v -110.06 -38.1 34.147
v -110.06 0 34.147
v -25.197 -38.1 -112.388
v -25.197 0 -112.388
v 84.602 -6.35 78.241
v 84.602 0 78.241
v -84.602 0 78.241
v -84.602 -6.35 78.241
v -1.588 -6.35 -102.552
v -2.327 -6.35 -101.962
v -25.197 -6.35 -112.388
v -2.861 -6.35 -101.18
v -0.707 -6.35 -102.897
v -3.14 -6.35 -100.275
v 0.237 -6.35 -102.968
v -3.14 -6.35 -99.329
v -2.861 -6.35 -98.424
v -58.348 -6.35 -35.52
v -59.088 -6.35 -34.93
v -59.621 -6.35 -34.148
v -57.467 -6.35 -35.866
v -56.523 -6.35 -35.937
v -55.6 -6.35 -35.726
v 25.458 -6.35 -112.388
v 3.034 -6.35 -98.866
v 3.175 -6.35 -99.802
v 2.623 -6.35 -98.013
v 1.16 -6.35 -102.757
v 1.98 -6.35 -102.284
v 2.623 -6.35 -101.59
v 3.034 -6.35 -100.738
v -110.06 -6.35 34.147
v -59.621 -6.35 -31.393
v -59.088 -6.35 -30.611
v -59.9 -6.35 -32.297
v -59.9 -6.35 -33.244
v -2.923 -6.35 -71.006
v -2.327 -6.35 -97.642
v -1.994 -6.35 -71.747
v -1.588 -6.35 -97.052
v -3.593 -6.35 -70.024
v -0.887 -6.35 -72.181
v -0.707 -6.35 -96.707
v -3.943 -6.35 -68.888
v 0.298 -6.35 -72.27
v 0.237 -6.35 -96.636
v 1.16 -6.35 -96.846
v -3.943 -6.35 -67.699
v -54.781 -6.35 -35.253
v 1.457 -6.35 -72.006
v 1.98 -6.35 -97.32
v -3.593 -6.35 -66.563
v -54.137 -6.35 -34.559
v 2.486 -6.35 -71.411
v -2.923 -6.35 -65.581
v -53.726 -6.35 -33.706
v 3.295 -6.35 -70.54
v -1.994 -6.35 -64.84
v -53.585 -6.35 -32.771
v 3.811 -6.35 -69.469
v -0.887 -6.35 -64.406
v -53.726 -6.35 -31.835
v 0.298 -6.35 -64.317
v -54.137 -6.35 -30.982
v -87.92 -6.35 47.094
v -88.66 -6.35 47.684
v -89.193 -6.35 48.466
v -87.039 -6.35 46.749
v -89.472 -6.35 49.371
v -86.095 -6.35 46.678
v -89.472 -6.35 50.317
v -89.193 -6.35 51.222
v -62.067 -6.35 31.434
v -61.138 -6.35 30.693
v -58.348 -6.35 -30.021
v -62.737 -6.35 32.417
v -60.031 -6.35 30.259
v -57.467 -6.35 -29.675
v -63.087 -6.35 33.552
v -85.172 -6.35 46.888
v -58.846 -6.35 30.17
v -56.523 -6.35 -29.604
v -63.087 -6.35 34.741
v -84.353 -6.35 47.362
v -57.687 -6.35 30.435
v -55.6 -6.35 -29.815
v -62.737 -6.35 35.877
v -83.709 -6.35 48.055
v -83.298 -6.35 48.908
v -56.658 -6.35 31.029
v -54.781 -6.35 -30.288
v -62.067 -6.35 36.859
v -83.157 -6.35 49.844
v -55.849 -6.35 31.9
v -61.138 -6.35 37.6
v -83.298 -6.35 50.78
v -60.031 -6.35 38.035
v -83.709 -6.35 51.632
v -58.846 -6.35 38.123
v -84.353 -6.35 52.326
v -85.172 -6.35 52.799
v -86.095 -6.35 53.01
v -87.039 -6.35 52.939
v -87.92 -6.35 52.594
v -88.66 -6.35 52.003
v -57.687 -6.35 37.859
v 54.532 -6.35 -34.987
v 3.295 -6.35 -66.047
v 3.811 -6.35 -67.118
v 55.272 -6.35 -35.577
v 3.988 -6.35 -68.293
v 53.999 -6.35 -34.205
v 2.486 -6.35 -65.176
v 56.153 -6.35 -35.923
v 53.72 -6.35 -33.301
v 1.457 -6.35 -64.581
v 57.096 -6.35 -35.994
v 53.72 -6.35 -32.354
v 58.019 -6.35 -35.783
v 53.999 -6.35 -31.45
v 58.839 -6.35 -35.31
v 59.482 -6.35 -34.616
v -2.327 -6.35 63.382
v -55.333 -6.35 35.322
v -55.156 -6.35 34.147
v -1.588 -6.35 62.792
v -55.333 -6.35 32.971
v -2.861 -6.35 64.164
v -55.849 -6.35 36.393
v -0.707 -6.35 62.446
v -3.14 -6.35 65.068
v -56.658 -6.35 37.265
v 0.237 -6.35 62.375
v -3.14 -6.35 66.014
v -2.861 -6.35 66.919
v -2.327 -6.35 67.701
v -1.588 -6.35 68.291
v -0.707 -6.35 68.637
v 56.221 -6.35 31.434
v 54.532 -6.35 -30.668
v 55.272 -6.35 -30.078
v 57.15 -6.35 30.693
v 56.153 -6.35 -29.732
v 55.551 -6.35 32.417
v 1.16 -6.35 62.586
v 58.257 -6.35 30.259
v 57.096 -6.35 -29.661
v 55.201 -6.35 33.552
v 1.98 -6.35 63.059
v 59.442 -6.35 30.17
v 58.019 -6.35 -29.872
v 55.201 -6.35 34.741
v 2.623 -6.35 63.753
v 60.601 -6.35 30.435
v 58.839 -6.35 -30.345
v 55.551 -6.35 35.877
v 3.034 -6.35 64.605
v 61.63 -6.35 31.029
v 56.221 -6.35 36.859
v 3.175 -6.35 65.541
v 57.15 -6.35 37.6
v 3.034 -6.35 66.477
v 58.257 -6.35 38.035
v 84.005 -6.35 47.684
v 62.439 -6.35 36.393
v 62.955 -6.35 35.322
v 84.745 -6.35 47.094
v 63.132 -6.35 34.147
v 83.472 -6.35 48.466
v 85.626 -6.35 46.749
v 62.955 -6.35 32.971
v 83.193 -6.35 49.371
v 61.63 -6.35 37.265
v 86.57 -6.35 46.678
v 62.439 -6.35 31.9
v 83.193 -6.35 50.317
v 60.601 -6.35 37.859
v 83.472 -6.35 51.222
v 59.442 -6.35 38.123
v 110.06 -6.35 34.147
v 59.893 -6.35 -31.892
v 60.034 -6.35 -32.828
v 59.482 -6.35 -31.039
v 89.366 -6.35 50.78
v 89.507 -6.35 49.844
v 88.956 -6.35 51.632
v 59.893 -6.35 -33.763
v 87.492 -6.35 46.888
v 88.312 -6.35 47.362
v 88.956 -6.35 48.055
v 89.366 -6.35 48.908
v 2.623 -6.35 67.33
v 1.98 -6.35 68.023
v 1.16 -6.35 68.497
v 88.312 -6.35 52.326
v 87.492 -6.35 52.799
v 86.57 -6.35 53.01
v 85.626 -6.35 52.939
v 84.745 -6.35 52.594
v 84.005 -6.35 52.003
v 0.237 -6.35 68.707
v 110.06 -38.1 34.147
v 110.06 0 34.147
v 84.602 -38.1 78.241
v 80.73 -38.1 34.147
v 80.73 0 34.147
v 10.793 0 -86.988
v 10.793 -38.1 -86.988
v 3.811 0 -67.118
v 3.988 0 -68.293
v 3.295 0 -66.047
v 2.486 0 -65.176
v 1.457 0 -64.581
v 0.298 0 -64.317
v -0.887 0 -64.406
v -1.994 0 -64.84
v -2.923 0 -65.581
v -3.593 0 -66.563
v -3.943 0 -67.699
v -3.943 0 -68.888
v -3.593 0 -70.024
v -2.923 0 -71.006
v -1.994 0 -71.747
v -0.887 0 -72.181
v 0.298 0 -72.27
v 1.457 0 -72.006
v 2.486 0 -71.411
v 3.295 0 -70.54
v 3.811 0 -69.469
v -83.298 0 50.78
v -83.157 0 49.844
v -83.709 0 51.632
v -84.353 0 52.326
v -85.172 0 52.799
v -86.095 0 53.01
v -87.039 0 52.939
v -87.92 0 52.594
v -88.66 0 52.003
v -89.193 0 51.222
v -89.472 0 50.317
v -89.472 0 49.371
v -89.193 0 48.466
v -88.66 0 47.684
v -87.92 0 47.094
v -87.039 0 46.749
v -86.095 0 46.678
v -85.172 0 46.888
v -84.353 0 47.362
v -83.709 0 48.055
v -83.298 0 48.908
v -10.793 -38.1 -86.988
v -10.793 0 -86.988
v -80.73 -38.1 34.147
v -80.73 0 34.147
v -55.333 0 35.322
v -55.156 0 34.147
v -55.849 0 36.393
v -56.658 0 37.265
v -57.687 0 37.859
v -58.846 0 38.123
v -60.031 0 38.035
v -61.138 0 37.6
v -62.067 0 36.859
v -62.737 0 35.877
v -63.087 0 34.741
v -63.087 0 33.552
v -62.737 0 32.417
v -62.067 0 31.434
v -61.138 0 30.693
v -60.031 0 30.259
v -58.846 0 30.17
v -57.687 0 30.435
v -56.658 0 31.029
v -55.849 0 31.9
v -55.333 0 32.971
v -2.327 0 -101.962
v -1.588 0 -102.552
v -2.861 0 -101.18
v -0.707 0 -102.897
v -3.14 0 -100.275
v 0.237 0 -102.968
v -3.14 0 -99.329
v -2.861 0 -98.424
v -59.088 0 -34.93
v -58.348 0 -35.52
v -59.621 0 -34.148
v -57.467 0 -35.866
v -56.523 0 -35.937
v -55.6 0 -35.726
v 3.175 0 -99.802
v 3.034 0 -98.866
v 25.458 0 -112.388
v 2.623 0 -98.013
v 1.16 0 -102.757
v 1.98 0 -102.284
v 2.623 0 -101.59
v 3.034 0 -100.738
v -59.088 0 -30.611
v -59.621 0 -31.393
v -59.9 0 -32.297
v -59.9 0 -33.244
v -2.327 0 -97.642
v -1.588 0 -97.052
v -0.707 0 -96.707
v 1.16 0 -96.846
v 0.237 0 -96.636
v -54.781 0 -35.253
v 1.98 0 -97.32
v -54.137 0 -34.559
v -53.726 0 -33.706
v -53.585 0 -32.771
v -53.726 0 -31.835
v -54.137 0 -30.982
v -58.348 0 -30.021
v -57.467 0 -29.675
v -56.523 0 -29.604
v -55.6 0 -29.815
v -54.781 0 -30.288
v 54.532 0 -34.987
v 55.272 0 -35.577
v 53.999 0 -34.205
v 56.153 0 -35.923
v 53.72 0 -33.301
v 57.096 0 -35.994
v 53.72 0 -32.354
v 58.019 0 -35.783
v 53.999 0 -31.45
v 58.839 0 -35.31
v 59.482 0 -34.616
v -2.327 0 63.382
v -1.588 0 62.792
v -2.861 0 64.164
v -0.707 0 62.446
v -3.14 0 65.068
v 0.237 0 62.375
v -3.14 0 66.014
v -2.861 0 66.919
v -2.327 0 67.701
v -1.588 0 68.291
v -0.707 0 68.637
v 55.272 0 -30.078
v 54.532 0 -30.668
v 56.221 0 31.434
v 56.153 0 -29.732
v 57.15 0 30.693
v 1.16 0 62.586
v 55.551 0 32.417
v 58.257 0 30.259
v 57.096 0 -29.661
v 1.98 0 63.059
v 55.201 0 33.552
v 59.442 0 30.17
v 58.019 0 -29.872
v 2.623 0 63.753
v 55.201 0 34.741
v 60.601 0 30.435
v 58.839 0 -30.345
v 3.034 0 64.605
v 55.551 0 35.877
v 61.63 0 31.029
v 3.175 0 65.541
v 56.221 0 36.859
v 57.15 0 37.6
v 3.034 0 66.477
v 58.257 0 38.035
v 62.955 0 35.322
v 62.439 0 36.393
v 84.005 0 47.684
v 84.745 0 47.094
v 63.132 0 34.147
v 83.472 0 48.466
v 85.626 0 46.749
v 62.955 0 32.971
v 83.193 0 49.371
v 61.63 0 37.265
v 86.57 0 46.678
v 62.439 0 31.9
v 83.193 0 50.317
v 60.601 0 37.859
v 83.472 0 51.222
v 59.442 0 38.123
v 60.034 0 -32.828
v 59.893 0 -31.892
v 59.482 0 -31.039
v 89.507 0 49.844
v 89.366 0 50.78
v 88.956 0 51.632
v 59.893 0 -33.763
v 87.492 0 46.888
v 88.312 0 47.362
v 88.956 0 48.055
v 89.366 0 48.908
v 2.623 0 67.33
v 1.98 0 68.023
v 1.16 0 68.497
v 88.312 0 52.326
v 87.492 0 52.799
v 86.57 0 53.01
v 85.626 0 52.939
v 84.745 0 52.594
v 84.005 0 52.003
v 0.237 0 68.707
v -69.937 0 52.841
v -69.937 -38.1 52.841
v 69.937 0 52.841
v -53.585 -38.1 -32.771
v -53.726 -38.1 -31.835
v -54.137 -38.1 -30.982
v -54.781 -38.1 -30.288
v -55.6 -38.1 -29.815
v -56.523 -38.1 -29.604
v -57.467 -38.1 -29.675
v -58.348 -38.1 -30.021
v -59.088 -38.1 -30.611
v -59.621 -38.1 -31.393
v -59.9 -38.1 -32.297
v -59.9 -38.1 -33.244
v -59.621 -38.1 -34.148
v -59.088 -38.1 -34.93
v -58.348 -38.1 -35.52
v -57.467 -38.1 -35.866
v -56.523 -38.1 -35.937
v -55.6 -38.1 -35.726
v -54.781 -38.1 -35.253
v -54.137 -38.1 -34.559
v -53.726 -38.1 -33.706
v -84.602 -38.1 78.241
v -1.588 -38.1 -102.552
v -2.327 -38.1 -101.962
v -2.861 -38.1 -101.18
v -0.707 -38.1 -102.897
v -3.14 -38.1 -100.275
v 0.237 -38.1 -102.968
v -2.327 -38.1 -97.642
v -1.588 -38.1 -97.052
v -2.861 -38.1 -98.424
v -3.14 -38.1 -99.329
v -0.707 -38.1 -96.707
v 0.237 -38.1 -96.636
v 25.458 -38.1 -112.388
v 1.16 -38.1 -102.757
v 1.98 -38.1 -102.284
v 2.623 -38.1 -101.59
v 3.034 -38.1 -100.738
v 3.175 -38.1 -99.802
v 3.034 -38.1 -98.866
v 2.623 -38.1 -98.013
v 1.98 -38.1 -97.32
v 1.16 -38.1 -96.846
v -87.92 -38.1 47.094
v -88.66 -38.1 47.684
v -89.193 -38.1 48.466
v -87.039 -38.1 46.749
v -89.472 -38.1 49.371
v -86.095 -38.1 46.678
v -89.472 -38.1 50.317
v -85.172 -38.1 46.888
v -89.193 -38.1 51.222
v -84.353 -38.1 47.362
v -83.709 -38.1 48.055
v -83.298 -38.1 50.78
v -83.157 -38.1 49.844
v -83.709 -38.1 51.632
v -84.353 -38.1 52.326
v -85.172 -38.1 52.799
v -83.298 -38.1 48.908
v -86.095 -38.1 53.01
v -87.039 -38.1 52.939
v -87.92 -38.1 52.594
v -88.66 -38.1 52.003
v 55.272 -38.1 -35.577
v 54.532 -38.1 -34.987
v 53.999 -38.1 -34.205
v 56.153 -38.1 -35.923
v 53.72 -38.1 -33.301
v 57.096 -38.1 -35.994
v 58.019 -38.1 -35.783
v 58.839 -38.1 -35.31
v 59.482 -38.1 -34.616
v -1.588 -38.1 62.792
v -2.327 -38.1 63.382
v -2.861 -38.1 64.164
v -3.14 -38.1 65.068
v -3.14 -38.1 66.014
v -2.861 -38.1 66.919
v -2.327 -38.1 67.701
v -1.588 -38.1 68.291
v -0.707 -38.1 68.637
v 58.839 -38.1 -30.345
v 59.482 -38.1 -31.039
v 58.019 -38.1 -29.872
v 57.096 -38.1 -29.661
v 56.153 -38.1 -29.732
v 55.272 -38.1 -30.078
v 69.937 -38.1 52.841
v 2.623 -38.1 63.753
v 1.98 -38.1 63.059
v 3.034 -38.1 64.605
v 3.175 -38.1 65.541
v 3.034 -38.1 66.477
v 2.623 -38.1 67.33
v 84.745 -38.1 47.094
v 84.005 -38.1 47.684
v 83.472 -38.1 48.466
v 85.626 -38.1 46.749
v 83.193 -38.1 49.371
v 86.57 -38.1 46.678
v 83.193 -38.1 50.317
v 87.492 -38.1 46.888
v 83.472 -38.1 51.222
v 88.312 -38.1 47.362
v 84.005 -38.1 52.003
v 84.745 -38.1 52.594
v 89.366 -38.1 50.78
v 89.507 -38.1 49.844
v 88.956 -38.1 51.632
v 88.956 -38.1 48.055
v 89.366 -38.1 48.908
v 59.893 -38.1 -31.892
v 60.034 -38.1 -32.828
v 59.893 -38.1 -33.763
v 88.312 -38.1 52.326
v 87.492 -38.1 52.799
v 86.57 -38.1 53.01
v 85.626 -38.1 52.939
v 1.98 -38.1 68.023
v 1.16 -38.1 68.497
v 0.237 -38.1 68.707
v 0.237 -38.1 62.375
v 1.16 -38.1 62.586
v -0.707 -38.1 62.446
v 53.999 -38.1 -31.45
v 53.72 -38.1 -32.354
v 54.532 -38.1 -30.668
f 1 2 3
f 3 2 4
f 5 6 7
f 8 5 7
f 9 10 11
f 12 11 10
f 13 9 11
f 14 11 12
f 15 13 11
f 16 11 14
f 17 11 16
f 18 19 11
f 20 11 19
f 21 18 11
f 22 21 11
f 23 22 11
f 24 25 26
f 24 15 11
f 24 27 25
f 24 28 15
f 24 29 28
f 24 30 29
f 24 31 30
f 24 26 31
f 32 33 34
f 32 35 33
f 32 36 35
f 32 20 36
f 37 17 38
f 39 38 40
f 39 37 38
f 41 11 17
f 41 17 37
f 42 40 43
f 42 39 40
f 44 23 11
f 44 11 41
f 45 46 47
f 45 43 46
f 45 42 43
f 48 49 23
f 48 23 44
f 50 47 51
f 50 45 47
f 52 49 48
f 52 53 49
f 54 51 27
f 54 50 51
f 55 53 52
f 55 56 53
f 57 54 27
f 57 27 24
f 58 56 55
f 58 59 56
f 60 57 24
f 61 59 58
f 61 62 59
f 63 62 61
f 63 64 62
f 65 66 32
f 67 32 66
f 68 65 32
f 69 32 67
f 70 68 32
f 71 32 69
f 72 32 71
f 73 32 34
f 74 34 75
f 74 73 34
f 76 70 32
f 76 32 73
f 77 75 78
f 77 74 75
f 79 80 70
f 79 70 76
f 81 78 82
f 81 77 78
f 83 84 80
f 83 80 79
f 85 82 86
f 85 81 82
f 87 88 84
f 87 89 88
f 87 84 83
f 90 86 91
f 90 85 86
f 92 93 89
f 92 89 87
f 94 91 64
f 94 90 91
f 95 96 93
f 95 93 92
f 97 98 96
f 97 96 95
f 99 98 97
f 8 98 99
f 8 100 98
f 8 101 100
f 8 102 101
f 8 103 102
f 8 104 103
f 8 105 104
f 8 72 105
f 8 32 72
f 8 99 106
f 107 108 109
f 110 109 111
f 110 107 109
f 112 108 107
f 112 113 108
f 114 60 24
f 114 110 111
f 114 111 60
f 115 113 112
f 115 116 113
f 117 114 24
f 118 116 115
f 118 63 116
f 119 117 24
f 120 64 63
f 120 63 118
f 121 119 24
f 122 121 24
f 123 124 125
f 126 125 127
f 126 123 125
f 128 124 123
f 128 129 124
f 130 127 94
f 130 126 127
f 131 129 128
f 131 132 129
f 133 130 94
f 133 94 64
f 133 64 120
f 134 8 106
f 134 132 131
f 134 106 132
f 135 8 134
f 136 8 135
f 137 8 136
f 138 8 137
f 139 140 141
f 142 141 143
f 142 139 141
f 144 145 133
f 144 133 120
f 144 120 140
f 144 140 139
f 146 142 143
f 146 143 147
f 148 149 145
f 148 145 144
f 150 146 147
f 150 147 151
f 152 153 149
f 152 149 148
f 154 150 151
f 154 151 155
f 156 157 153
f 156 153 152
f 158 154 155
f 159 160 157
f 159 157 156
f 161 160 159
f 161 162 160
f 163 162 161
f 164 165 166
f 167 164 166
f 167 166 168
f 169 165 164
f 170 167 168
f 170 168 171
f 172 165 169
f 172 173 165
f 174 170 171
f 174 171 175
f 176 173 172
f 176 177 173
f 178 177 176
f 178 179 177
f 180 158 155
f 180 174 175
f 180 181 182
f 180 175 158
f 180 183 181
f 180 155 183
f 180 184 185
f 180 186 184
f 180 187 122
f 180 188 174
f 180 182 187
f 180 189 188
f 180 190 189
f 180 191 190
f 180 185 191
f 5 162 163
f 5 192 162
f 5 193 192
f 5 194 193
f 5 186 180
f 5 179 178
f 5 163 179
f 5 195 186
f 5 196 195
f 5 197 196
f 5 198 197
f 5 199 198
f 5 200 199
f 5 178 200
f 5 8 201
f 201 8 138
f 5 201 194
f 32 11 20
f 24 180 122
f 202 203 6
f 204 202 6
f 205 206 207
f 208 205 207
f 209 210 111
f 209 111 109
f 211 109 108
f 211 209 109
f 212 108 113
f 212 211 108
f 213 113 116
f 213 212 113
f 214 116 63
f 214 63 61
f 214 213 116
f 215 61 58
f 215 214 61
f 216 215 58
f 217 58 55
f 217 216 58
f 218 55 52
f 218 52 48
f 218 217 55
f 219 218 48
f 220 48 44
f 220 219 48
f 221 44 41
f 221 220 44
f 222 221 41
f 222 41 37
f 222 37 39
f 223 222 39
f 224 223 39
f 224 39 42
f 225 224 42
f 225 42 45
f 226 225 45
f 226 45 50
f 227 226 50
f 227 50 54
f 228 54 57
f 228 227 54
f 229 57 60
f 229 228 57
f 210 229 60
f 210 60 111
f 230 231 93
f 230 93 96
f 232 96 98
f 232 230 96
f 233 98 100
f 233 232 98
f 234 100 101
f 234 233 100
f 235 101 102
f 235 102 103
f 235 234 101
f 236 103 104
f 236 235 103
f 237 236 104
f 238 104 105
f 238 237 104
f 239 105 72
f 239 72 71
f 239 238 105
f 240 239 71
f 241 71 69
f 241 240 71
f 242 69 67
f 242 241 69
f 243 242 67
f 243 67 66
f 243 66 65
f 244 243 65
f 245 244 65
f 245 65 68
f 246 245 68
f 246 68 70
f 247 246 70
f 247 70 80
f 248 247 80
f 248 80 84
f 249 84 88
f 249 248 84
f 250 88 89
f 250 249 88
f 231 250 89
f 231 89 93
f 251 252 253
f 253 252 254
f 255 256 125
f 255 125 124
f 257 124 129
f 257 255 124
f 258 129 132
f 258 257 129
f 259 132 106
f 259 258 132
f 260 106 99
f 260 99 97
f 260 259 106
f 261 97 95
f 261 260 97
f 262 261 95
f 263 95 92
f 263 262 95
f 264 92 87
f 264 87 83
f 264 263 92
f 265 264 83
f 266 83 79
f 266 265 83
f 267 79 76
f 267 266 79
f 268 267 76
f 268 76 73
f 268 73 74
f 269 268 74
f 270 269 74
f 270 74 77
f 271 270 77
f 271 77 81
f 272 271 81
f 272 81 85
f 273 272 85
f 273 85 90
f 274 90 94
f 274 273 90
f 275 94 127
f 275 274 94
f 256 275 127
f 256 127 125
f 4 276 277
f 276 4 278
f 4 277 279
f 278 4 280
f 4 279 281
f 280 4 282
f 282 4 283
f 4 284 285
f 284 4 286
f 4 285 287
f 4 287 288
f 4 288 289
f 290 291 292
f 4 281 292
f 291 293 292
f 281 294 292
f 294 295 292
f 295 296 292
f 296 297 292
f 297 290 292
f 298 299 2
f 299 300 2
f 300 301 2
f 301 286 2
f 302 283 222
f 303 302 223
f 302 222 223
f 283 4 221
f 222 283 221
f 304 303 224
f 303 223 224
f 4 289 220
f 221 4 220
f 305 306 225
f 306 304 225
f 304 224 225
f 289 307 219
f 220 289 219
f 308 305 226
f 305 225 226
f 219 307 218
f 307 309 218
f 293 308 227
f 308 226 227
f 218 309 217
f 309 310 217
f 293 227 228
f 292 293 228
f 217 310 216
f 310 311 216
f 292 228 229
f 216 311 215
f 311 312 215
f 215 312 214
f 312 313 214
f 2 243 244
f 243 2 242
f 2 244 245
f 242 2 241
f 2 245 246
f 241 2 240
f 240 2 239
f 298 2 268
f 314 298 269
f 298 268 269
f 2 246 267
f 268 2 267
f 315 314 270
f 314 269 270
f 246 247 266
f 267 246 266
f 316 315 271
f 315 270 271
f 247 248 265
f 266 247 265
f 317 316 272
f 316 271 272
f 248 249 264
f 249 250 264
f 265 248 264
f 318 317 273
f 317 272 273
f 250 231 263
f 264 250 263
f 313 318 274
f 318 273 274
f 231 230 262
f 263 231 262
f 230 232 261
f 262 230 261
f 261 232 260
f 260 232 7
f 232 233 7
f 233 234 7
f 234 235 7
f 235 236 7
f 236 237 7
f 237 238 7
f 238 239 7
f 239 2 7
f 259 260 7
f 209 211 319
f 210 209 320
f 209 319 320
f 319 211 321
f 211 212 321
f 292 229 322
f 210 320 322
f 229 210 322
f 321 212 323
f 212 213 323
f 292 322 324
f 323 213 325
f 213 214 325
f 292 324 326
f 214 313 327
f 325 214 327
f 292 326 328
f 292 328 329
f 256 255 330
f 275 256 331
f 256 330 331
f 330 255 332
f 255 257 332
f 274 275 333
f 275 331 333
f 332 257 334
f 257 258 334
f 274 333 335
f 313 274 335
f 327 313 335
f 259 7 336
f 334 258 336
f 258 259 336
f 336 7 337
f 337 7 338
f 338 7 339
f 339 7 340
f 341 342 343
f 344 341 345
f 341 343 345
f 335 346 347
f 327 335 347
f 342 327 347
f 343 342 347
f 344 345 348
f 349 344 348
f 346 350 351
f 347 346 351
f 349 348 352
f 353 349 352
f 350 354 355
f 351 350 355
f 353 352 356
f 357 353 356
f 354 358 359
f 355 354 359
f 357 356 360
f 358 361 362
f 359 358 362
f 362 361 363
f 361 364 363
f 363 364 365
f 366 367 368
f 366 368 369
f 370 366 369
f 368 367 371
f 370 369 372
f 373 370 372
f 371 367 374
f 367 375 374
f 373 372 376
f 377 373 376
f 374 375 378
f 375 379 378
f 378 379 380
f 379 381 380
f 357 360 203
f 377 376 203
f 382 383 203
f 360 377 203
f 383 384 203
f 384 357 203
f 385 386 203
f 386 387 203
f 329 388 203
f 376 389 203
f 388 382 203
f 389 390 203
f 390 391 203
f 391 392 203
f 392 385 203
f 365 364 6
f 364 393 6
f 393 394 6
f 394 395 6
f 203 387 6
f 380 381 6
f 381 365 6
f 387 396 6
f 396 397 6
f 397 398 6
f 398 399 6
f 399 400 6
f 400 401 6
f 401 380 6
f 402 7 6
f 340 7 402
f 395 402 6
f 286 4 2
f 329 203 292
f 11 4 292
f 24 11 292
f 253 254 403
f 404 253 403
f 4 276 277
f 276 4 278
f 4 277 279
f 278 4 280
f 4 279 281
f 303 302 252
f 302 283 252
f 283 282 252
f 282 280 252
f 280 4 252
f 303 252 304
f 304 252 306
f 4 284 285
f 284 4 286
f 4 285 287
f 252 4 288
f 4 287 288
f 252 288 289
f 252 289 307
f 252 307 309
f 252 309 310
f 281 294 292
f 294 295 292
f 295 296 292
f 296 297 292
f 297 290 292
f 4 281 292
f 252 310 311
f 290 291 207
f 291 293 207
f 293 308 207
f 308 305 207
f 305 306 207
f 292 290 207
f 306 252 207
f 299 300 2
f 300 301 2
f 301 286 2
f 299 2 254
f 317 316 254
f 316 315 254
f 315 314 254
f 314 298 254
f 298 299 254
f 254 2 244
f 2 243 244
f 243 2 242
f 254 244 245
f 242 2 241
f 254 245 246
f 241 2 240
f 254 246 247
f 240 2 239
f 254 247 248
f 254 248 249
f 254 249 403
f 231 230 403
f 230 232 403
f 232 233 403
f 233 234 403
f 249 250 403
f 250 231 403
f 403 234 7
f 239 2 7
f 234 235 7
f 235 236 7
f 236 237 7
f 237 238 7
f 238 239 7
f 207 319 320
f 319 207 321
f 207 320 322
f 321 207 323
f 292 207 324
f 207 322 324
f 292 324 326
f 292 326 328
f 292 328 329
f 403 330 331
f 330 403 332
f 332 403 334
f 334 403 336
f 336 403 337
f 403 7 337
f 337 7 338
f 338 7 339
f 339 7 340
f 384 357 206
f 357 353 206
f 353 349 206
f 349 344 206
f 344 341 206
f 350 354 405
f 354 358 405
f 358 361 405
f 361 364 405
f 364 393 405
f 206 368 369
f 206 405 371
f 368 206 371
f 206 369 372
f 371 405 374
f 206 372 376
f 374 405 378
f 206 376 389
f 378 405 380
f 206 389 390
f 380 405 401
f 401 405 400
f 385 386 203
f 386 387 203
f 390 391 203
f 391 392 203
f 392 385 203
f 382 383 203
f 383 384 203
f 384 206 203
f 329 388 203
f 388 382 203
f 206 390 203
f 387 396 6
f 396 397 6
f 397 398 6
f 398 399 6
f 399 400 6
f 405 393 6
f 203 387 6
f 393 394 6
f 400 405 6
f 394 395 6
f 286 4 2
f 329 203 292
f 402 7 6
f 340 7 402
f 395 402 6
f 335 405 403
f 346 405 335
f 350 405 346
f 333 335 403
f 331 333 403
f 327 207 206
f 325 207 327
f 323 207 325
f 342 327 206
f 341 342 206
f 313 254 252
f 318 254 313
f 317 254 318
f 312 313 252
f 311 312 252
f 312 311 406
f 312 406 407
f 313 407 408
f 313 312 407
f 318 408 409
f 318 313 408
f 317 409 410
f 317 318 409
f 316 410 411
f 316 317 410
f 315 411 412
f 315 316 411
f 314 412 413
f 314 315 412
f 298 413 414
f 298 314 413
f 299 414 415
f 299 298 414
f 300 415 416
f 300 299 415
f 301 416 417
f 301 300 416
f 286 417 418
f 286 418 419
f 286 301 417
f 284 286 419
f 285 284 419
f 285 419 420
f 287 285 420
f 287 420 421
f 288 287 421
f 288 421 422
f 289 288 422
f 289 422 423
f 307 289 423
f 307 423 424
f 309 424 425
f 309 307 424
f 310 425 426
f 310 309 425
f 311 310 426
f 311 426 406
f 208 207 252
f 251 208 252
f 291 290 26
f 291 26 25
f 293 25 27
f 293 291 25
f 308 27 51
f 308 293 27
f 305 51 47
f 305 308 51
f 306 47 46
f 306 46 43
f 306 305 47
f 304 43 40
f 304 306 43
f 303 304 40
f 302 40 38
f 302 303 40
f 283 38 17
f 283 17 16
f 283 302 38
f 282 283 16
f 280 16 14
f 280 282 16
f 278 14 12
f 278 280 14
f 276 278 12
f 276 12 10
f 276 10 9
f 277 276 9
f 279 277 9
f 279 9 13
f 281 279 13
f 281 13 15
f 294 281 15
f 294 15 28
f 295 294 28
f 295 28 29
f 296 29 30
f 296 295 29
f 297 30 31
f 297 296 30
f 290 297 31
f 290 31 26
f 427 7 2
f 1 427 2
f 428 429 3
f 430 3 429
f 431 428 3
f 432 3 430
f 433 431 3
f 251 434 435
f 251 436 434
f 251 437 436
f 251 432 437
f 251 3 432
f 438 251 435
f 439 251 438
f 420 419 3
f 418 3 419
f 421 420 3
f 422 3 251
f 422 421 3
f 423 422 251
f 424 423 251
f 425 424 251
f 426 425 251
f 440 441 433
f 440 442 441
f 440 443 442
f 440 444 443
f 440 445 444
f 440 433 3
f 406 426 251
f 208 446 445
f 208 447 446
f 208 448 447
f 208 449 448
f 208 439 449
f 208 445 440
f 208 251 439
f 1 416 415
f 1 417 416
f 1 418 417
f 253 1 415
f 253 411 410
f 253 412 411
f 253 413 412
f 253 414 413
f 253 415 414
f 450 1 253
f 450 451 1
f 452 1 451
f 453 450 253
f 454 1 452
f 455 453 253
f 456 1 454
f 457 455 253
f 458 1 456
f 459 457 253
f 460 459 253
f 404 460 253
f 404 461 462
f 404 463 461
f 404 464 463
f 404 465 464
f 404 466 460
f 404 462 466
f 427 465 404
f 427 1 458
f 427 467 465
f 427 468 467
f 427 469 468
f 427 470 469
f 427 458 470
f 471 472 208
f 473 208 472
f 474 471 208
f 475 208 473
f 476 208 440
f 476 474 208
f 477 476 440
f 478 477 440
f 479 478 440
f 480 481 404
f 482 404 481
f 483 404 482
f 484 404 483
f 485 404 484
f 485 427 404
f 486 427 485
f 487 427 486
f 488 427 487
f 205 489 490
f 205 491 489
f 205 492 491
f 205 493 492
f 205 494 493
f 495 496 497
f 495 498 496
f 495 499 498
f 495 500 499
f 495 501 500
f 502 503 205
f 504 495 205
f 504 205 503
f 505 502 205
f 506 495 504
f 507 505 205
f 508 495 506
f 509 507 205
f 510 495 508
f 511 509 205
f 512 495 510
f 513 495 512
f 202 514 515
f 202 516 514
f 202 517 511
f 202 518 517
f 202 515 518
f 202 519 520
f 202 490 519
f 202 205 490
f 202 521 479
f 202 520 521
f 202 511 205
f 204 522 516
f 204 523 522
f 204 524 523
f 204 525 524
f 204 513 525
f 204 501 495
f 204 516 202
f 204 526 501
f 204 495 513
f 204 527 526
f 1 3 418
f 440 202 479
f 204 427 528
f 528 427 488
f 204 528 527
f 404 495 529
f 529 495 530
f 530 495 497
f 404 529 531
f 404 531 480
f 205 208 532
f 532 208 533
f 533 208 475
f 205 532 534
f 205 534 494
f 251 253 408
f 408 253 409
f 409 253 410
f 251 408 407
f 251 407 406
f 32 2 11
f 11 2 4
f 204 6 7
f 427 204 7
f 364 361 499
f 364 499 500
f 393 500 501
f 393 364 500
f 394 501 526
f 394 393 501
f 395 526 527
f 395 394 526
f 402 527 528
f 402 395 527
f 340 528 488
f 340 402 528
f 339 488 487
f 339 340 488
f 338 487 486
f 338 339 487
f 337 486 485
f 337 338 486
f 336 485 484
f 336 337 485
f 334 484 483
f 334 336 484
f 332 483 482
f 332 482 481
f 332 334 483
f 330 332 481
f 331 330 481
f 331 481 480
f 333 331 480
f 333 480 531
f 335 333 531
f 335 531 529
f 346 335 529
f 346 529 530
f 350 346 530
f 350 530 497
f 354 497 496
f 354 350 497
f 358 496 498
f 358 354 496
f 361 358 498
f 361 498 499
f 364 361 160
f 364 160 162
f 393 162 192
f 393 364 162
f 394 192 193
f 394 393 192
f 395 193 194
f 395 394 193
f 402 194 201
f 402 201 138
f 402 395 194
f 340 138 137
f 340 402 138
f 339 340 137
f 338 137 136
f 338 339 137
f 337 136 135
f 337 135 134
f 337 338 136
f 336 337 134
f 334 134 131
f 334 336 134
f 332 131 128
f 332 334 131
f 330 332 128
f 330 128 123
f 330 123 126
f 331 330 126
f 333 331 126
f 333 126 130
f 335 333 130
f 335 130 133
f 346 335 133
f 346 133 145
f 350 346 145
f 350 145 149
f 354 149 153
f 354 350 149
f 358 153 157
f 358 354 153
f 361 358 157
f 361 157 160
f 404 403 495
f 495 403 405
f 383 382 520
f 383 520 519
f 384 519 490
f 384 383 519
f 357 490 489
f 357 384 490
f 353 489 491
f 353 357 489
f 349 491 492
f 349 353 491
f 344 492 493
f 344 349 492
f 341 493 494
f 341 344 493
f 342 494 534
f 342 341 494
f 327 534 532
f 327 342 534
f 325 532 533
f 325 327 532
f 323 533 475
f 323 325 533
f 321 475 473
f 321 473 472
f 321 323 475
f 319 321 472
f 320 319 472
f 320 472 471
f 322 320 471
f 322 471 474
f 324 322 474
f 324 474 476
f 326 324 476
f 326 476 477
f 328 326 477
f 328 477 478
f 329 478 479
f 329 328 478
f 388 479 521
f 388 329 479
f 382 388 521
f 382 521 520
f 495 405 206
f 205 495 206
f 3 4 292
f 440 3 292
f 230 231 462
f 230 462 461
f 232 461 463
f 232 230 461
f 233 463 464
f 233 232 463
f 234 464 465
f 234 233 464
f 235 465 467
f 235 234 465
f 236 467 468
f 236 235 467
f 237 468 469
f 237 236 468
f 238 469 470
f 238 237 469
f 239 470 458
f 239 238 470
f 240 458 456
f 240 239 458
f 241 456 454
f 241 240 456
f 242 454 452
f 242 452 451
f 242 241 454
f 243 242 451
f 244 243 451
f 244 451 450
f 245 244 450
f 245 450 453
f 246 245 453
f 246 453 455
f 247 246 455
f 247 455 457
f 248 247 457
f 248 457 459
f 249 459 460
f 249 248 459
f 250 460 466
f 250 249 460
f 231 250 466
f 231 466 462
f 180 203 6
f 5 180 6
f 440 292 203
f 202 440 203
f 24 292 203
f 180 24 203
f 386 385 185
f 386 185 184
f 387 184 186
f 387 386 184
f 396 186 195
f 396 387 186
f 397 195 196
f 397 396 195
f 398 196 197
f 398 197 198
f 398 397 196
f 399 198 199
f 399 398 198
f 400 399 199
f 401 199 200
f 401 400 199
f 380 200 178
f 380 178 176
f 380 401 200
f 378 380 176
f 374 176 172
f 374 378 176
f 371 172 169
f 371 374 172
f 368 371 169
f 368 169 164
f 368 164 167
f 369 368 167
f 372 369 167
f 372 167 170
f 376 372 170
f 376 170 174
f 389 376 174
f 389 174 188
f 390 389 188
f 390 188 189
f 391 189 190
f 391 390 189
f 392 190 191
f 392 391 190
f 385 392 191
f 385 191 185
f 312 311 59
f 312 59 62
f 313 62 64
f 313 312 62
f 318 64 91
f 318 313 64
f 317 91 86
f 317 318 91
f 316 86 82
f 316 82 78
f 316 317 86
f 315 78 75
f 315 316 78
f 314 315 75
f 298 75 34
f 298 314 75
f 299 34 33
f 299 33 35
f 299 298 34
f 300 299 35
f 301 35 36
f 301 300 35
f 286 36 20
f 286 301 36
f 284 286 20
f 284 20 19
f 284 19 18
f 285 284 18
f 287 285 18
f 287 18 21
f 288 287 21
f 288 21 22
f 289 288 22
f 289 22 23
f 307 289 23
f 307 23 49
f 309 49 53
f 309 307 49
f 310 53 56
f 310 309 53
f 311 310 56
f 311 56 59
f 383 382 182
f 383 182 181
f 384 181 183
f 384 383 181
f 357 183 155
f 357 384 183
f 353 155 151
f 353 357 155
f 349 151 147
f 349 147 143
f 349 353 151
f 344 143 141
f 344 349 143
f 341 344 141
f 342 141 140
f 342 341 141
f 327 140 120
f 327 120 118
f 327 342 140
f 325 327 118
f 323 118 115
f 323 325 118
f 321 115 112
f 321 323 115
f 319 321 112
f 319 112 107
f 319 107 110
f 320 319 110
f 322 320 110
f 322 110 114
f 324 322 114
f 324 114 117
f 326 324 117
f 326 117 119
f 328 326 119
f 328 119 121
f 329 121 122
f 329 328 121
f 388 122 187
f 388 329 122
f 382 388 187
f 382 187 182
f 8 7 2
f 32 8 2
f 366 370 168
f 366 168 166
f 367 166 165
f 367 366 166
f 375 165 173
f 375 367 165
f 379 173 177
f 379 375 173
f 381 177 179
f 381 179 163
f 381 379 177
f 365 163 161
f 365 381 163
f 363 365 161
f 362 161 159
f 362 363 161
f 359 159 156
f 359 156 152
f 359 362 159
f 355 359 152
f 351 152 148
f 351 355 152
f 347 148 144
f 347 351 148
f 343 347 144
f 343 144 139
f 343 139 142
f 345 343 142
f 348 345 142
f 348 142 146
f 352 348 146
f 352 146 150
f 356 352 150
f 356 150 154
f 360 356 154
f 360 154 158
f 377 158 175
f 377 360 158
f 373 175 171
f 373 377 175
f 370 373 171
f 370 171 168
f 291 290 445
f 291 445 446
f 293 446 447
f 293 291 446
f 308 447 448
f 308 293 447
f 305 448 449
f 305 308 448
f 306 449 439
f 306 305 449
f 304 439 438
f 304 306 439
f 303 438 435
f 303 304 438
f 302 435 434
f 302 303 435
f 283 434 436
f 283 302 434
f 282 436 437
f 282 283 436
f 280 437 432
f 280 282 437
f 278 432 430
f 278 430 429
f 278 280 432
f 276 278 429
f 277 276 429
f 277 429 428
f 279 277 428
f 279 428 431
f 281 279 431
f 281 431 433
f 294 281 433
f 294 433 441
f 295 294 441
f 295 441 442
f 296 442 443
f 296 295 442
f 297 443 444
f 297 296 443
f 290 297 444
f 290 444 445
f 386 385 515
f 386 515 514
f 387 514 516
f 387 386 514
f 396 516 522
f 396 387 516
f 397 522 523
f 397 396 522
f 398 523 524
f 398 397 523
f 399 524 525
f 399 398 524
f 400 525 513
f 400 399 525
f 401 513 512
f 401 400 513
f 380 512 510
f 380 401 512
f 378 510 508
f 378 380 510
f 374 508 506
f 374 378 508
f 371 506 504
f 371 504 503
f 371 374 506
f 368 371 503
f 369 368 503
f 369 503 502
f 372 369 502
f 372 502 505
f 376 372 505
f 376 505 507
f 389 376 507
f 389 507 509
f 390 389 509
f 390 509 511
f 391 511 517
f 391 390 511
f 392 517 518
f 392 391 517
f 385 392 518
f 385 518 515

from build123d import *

# Parameters (mm, degrees)
F0_R     = 3.9878
F0_R_2   = 3.175
F1_DEPTH = 6.35
F2_DEPTH = 38.1


with BuildPart() as f1:
    # F0 (on Front) → F1 (new body)
    with BuildSketch(Plane.XZ):
        Polygon((69.937115, 52.841144), (-69.937115, 52.841144), (-80.73033, 34.146747), (-10.793215, -86.98789), (10.793215, -86.98789), (80.73033, 34.146747), align=None)
        with BuildLine():
            ThreePointArc((5.191303, -71.290693), (0, -74.287893), (-5.191303, -71.290693))
            Line((-5.191303, -71.290693), (-64.335203, 31.149547))
            ThreePointArc((-64.335203, 31.149547), (-64.335203, 37.143947), (-59.1439, 40.141147))
            Line((-59.1439, 40.141147), (59.1439, 40.141147))
            ThreePointArc((59.1439, 40.141147), (64.335203, 37.143947), (64.335203, 31.149547))
            Line((64.335203, 31.149547), (5.191303, -71.290693))
        make_face(mode=Mode.SUBTRACT)
        with BuildLine():
            Line((-64.335203, 31.149547), (-5.191303, -71.290693))
            ThreePointArc((-5.191303, -71.290693), (0, -74.287893), (5.191303, -71.290693))
            Line((5.191303, -71.290693), (64.335203, 31.149547))
            ThreePointArc((64.335203, 31.149547), (64.335203, 37.143947), (59.1439, 40.141147))
            Line((59.1439, 40.141147), (-59.1439, 40.141147))
            ThreePointArc((-59.1439, 40.141147), (-64.335203, 37.143947), (-64.335203, 31.149547))
        make_face()
        with Locations((0, -68.293493)):
            Circle(F0_R, mode=Mode.SUBTRACT)
        with Locations((-59.1439, 34.146747)):
            Circle(F0_R, mode=Mode.SUBTRACT)
        with Locations((59.1439, 34.146747)):
            Circle(F0_R, mode=Mode.SUBTRACT)
        Polygon((-80.73033, 34.146747), (-69.937115, 52.841144), (-84.601812, 78.241144), (-110.059724, 34.146747), align=None)
        with Locations((-86.332245, 49.843945)):
            Circle(F0_R_2, mode=Mode.SUBTRACT)
        Polygon((-10.793215, -86.98789), (-80.73033, 34.146747), (-110.059724, 34.146747), (-25.196828, -112.38789), align=None)
        with Locations((-56.760295, -32.770572)):
            Circle(F0_R_2, mode=Mode.SUBTRACT)
        Polygon((10.793215, -86.98789), (-10.793215, -86.98789), (-25.196828, -112.38789), (25.457912, -112.38789), align=None)
        with Locations((0, -99.801958)):
            Circle(F0_R_2, mode=Mode.SUBTRACT)
        Polygon((110.059724, 34.146747), (80.73033, 34.146747), (10.793215, -86.98789), (25.457912, -112.38789), align=None)
        with Locations((56.859081, -32.827606)):
            Circle(F0_R_2, mode=Mode.SUBTRACT)
        Polygon((84.601812, 78.241144), (69.937115, 52.841144), (80.73033, 34.146747), (110.059724, 34.146747), align=None)
        with Locations((86.332245, 49.843945)):
            Circle(F0_R_2, mode=Mode.SUBTRACT)
        Polygon((-84.601812, 78.241144), (-69.937115, 52.841144), (69.937115, 52.841144), (84.601812, 78.241144), align=None)
        with Locations((0, 65.541144)):
            Circle(F0_R_2, mode=Mode.SUBTRACT)
    extrude(amount=F1_DEPTH)


with BuildPart() as f2:
    # F0 (on Front) → F2 (new body)
    with BuildSketch(Plane.XZ):
        Polygon((-80.73033, 34.146747), (-69.937115, 52.841144), (-84.601812, 78.241144), (-110.059724, 34.146747), align=None)
        with Locations((-86.332245, 49.843945)):
            Circle(F0_R_2, mode=Mode.SUBTRACT)
        Polygon((-10.793215, -86.98789), (-80.73033, 34.146747), (-110.059724, 34.146747), (-25.196828, -112.38789), align=None)
        with Locations((-56.760295, -32.770572)):
            Circle(F0_R_2, mode=Mode.SUBTRACT)
        Polygon((10.793215, -86.98789), (-10.793215, -86.98789), (-25.196828, -112.38789), (25.457912, -112.38789), align=None)
        with Locations((0, -99.801958)):
            Circle(F0_R_2, mode=Mode.SUBTRACT)
        Polygon((110.059724, 34.146747), (80.73033, 34.146747), (10.793215, -86.98789), (25.457912, -112.38789), align=None)
        with Locations((56.859081, -32.827606)):
            Circle(F0_R_2, mode=Mode.SUBTRACT)
        Polygon((84.601812, 78.241144), (69.937115, 52.841144), (80.73033, 34.146747), (110.059724, 34.146747), align=None)
        with Locations((86.332245, 49.843945)):
            Circle(F0_R_2, mode=Mode.SUBTRACT)
        Polygon((-84.601812, 78.241144), (-69.937115, 52.841144), (69.937115, 52.841144), (84.601812, 78.241144), align=None)
        with Locations((0, 65.541144)):
            Circle(F0_R_2, mode=Mode.SUBTRACT)
    extrude(amount=F2_DEPTH)


solid = Compound([f1.part, f2.part])
